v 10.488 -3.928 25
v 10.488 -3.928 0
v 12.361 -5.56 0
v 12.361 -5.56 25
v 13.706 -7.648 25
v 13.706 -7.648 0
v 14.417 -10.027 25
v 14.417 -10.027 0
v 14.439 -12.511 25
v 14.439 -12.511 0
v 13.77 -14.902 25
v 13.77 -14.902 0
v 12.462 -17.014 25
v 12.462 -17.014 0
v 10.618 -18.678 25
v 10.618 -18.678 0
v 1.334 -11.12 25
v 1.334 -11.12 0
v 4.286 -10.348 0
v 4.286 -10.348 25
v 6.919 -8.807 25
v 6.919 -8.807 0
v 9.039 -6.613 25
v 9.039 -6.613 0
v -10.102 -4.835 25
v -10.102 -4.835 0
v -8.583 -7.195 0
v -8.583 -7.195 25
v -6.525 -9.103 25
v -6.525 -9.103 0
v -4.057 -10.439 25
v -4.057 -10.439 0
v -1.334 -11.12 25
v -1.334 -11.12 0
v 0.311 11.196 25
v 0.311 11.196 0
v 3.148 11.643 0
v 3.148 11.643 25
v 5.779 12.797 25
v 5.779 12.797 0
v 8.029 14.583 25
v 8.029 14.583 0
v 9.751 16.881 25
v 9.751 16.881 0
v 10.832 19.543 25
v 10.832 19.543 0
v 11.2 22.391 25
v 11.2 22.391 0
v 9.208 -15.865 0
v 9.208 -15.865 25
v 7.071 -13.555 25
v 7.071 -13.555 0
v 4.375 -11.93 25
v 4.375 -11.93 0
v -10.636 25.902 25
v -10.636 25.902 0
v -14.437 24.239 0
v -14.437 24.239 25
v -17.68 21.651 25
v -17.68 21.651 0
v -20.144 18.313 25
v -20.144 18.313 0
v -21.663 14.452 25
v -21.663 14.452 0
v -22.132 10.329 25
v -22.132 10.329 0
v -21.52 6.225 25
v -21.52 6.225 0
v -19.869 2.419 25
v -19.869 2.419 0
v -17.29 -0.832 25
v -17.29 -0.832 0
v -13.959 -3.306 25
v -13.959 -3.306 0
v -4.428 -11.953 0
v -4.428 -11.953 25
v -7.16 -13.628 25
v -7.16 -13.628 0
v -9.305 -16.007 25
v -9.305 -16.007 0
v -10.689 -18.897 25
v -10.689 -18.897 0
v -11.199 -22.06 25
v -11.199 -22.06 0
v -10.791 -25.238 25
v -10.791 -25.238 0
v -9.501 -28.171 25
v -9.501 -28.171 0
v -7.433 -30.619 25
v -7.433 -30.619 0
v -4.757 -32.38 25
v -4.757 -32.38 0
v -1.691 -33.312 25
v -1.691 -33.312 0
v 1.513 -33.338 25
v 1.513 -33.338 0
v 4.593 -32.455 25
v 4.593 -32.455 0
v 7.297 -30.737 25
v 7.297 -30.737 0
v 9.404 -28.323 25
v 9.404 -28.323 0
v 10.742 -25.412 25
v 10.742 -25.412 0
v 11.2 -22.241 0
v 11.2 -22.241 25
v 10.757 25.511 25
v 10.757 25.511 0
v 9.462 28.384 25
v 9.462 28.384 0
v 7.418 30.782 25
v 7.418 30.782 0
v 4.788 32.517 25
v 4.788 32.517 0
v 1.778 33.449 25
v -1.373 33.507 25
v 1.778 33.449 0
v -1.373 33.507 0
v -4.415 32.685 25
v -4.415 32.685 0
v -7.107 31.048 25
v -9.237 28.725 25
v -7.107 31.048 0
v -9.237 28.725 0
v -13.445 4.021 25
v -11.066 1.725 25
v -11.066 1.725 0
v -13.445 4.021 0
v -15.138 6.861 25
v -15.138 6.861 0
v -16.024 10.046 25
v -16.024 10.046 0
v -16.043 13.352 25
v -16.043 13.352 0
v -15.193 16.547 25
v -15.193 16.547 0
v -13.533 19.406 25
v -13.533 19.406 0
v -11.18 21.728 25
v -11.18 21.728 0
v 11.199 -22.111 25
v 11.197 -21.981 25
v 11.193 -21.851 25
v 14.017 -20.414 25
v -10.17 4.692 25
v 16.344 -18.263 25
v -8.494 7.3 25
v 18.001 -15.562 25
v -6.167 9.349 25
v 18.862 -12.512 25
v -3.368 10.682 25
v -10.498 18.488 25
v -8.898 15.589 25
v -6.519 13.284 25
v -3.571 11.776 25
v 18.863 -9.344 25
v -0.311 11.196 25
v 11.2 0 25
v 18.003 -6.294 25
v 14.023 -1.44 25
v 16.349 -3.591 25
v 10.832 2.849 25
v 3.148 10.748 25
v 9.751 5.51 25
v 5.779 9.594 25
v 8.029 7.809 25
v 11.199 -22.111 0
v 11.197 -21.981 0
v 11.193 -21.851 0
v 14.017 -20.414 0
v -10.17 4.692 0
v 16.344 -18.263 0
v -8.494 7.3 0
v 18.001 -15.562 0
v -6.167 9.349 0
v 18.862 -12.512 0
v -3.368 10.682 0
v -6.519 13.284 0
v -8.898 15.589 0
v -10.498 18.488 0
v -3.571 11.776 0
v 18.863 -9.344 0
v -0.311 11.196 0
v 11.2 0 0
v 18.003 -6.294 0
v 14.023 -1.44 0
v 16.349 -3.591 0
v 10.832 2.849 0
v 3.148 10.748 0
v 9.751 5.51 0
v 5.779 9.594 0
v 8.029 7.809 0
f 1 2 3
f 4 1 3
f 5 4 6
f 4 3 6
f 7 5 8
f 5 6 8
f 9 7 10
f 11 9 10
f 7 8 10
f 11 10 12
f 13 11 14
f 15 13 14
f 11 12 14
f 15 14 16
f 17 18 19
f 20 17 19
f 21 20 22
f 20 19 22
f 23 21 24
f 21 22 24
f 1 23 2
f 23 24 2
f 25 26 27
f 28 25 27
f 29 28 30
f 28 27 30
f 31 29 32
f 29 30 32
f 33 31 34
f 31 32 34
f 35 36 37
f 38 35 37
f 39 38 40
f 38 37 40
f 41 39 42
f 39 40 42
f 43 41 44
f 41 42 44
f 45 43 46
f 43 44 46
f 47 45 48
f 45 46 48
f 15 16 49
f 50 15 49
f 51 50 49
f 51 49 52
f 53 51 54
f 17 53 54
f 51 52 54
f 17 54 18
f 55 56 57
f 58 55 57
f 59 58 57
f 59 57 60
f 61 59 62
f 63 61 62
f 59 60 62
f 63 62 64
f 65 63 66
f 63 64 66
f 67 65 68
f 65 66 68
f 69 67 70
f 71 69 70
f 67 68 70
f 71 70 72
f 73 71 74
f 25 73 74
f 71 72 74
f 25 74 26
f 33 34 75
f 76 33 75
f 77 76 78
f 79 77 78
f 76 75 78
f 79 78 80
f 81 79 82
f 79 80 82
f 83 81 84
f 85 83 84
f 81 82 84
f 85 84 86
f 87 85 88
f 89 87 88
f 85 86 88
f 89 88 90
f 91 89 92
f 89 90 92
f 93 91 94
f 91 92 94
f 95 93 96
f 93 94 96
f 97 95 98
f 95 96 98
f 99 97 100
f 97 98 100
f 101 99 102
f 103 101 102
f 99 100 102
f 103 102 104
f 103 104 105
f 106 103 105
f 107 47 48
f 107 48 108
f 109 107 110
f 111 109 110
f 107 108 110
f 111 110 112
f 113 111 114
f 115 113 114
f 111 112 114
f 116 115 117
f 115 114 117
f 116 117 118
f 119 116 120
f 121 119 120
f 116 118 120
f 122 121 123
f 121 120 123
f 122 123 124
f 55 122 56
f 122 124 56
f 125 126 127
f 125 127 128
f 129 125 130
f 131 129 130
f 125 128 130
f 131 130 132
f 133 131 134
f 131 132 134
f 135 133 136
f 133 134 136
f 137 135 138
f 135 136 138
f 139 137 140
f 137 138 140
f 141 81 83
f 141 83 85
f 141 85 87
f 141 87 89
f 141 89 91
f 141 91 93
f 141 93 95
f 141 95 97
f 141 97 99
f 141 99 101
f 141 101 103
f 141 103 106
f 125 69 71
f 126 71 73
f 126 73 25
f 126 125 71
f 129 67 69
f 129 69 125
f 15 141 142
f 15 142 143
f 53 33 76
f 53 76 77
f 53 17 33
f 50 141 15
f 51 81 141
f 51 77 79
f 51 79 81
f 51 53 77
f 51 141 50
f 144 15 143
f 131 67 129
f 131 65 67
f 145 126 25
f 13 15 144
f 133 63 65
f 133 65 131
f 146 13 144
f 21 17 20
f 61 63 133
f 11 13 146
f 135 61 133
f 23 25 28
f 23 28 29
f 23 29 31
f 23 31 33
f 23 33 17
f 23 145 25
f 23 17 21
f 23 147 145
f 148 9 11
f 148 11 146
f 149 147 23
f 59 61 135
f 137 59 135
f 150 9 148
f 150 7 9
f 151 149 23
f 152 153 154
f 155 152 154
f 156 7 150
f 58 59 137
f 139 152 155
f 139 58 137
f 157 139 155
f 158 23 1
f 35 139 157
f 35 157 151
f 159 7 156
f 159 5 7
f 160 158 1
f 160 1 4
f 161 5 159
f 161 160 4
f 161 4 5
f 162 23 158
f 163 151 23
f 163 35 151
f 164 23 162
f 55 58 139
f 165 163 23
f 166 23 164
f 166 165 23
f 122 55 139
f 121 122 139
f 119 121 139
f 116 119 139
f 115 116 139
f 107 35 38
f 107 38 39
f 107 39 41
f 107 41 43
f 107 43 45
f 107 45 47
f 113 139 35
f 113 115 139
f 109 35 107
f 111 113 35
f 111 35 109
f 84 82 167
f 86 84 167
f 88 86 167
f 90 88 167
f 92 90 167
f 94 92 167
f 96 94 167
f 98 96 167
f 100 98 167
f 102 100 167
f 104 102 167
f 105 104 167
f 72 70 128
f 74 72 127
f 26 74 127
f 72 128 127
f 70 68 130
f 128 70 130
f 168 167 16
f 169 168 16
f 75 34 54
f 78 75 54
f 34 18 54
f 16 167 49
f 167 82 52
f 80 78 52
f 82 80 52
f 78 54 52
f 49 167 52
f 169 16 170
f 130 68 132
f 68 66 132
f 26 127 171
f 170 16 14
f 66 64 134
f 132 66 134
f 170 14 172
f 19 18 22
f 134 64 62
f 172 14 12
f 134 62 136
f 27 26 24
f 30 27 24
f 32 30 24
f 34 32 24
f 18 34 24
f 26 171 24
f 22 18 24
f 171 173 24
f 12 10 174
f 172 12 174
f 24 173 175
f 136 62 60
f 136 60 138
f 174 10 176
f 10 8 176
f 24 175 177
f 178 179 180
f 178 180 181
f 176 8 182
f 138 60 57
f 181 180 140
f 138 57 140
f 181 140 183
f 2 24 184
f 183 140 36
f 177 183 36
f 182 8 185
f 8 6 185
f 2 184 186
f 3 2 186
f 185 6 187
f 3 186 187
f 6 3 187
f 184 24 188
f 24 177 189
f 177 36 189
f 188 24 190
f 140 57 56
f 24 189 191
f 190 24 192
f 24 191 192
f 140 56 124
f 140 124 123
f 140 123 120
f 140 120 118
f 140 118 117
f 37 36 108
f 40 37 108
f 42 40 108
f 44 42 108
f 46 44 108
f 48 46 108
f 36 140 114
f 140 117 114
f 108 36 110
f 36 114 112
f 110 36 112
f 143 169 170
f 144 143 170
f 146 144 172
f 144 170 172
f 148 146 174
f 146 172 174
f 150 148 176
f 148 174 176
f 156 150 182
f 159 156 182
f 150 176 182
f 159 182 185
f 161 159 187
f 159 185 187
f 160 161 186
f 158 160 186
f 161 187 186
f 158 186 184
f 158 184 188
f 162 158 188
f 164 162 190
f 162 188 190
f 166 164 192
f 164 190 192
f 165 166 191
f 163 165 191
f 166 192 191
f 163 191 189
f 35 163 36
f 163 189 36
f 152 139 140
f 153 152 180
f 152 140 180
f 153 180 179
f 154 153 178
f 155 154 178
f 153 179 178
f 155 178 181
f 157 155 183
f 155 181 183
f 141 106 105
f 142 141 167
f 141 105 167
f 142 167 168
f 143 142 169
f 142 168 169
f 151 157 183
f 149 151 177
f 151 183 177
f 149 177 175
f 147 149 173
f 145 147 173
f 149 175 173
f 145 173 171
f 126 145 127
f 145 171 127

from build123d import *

# Parameters (mm, degrees)
F1_DEPTH = 25


with BuildPart() as f1:
    # F0 (on Top) → F1 (new body)
    with BuildSketch(Plane.XY):
        with BuildLine():
            ThreePointArc((-0.3111750606, 11.1956764013), (-7.4017548814, 8.4055948436), (-11.0663750249, 1.7249184932))
            ThreePointArc((-11.0663750249, 1.7249184932), (-11.0810170285, -1.6282080989), (-10.1024246207, -4.8353921022))
            ThreePointArc((-10.1024246207, -4.8353921022), (-6.5247892852, -9.1031381833), (-1.3339990852, -11.120271869))
            ThreePointArc((-1.3339990852, -11.120271869), (0, -11.040543738), (1.3339990852, -11.120271869))
            ThreePointArc((1.3339990852, -11.120271869), (6.9190712637, -8.8071818902), (10.4884666015, -3.9283671354))
            ThreePointArc((10.4884666015, -3.9283671354), (11.0206811481, -1.9961430389), (11.2, 0))
            ThreePointArc((11.2, 0), (8.0288592178, 7.808803984), (0.3111750606, 11.1956764013))
            ThreePointArc((0.3111750606, 11.1956764013), (0, 11.1913528025), (-0.3111750606, 11.1956764013))
        make_face()
        with BuildLine():
            ThreePointArc((-10.1024246207, -4.8353921022), (-11.0810170285, -1.6282080989), (-11.0663750249, 1.7249184932))
            ThreePointArc((-11.0663750249, 1.7249184932), (-16.1436885781, 11.6980871603), (-11.1803662832, 21.7284728944))
            ThreePointArc((-11.1803662832, 21.7284728944), (-11.10579848, 23.8409182968), (-10.6356586789, 25.9017323357))
            ThreePointArc((-10.6356586789, 25.9017323357), (-22.131772625, 10.3291078016), (-10.1024246207, -4.8353921022))
        make_face()
        with BuildLine():
            ThreePointArc((-11.1803662832, 21.7284728944), (-7.7941536491, 14.3482707506), (-0.3111750606, 11.1956764013))
            ThreePointArc((-0.3111750606, 11.1956764013), (0, 11.2), (0.3111750606, 11.1956764013))
            ThreePointArc((0.3111750606, 11.1956764013), (8.0288592178, 14.5825488185), (11.2, 22.3913528025))
            ThreePointArc((11.2, 22.3913528025), (1.777726469, 33.4493674797), (-10.6356586789, 25.9017323357))
            ThreePointArc((-10.6356586789, 25.9017323357), (-11.10579848, 23.8409182968), (-11.1803662832, 21.7284728944))
        make_face()
        with BuildLine():
            ThreePointArc((0.3111750606, 11.1956764013), (0, 11.2), (-0.3111750606, 11.1956764013))
            ThreePointArc((-0.3111750606, 11.1956764013), (0, 11.1913528025), (0.3111750606, 11.1956764013))
        make_face()
        with BuildLine():
            ThreePointArc((1.3339990852, -11.120271869), (0, -11.040543738), (-1.3339990852, -11.120271869))
            ThreePointArc((-1.3339990852, -11.120271869), (0, -11.2), (1.3339990852, -11.120271869))
        make_face()
        with BuildLine():
            ThreePointArc((1.3339990852, -11.120271869), (0, -11.2), (-1.3339990852, -11.120271869))
            ThreePointArc((-1.3339990852, -11.120271869), (-7.4330078113, -30.6185145471), (11.2, -22.240543738))
            ThreePointArc((11.2, -22.240543738), (11.1983095854, -22.0459610337), (11.193238852, -21.851437066))
            ThreePointArc((11.193238852, -21.851437066), (11.0205922894, -20.2439101733), (10.6182959163, -18.6779896214))
            ThreePointArc((10.6182959163, -18.6779896214), (7.0706515511, -13.5545845715), (1.3339990852, -11.120271869))
        make_face()
        with BuildLine():
            ThreePointArc((11.193238852, -21.851437066), (18.9710900132, -10.9281240657), (11.2, 0))
            ThreePointArc((11.2, 0), (11.0206811481, -1.9961430389), (10.4884666015, -3.9283671354))
            ThreePointArc((10.4884666015, -3.9283671354), (14.5159030008, -11.2682994191), (10.6182959163, -18.6779896214))
            ThreePointArc((10.6182959163, -18.6779896214), (11.0205922894, -20.2439101733), (11.193238852, -21.851437066))
        make_face()
    extrude(amount=F1_DEPTH)


solid = f1.part
